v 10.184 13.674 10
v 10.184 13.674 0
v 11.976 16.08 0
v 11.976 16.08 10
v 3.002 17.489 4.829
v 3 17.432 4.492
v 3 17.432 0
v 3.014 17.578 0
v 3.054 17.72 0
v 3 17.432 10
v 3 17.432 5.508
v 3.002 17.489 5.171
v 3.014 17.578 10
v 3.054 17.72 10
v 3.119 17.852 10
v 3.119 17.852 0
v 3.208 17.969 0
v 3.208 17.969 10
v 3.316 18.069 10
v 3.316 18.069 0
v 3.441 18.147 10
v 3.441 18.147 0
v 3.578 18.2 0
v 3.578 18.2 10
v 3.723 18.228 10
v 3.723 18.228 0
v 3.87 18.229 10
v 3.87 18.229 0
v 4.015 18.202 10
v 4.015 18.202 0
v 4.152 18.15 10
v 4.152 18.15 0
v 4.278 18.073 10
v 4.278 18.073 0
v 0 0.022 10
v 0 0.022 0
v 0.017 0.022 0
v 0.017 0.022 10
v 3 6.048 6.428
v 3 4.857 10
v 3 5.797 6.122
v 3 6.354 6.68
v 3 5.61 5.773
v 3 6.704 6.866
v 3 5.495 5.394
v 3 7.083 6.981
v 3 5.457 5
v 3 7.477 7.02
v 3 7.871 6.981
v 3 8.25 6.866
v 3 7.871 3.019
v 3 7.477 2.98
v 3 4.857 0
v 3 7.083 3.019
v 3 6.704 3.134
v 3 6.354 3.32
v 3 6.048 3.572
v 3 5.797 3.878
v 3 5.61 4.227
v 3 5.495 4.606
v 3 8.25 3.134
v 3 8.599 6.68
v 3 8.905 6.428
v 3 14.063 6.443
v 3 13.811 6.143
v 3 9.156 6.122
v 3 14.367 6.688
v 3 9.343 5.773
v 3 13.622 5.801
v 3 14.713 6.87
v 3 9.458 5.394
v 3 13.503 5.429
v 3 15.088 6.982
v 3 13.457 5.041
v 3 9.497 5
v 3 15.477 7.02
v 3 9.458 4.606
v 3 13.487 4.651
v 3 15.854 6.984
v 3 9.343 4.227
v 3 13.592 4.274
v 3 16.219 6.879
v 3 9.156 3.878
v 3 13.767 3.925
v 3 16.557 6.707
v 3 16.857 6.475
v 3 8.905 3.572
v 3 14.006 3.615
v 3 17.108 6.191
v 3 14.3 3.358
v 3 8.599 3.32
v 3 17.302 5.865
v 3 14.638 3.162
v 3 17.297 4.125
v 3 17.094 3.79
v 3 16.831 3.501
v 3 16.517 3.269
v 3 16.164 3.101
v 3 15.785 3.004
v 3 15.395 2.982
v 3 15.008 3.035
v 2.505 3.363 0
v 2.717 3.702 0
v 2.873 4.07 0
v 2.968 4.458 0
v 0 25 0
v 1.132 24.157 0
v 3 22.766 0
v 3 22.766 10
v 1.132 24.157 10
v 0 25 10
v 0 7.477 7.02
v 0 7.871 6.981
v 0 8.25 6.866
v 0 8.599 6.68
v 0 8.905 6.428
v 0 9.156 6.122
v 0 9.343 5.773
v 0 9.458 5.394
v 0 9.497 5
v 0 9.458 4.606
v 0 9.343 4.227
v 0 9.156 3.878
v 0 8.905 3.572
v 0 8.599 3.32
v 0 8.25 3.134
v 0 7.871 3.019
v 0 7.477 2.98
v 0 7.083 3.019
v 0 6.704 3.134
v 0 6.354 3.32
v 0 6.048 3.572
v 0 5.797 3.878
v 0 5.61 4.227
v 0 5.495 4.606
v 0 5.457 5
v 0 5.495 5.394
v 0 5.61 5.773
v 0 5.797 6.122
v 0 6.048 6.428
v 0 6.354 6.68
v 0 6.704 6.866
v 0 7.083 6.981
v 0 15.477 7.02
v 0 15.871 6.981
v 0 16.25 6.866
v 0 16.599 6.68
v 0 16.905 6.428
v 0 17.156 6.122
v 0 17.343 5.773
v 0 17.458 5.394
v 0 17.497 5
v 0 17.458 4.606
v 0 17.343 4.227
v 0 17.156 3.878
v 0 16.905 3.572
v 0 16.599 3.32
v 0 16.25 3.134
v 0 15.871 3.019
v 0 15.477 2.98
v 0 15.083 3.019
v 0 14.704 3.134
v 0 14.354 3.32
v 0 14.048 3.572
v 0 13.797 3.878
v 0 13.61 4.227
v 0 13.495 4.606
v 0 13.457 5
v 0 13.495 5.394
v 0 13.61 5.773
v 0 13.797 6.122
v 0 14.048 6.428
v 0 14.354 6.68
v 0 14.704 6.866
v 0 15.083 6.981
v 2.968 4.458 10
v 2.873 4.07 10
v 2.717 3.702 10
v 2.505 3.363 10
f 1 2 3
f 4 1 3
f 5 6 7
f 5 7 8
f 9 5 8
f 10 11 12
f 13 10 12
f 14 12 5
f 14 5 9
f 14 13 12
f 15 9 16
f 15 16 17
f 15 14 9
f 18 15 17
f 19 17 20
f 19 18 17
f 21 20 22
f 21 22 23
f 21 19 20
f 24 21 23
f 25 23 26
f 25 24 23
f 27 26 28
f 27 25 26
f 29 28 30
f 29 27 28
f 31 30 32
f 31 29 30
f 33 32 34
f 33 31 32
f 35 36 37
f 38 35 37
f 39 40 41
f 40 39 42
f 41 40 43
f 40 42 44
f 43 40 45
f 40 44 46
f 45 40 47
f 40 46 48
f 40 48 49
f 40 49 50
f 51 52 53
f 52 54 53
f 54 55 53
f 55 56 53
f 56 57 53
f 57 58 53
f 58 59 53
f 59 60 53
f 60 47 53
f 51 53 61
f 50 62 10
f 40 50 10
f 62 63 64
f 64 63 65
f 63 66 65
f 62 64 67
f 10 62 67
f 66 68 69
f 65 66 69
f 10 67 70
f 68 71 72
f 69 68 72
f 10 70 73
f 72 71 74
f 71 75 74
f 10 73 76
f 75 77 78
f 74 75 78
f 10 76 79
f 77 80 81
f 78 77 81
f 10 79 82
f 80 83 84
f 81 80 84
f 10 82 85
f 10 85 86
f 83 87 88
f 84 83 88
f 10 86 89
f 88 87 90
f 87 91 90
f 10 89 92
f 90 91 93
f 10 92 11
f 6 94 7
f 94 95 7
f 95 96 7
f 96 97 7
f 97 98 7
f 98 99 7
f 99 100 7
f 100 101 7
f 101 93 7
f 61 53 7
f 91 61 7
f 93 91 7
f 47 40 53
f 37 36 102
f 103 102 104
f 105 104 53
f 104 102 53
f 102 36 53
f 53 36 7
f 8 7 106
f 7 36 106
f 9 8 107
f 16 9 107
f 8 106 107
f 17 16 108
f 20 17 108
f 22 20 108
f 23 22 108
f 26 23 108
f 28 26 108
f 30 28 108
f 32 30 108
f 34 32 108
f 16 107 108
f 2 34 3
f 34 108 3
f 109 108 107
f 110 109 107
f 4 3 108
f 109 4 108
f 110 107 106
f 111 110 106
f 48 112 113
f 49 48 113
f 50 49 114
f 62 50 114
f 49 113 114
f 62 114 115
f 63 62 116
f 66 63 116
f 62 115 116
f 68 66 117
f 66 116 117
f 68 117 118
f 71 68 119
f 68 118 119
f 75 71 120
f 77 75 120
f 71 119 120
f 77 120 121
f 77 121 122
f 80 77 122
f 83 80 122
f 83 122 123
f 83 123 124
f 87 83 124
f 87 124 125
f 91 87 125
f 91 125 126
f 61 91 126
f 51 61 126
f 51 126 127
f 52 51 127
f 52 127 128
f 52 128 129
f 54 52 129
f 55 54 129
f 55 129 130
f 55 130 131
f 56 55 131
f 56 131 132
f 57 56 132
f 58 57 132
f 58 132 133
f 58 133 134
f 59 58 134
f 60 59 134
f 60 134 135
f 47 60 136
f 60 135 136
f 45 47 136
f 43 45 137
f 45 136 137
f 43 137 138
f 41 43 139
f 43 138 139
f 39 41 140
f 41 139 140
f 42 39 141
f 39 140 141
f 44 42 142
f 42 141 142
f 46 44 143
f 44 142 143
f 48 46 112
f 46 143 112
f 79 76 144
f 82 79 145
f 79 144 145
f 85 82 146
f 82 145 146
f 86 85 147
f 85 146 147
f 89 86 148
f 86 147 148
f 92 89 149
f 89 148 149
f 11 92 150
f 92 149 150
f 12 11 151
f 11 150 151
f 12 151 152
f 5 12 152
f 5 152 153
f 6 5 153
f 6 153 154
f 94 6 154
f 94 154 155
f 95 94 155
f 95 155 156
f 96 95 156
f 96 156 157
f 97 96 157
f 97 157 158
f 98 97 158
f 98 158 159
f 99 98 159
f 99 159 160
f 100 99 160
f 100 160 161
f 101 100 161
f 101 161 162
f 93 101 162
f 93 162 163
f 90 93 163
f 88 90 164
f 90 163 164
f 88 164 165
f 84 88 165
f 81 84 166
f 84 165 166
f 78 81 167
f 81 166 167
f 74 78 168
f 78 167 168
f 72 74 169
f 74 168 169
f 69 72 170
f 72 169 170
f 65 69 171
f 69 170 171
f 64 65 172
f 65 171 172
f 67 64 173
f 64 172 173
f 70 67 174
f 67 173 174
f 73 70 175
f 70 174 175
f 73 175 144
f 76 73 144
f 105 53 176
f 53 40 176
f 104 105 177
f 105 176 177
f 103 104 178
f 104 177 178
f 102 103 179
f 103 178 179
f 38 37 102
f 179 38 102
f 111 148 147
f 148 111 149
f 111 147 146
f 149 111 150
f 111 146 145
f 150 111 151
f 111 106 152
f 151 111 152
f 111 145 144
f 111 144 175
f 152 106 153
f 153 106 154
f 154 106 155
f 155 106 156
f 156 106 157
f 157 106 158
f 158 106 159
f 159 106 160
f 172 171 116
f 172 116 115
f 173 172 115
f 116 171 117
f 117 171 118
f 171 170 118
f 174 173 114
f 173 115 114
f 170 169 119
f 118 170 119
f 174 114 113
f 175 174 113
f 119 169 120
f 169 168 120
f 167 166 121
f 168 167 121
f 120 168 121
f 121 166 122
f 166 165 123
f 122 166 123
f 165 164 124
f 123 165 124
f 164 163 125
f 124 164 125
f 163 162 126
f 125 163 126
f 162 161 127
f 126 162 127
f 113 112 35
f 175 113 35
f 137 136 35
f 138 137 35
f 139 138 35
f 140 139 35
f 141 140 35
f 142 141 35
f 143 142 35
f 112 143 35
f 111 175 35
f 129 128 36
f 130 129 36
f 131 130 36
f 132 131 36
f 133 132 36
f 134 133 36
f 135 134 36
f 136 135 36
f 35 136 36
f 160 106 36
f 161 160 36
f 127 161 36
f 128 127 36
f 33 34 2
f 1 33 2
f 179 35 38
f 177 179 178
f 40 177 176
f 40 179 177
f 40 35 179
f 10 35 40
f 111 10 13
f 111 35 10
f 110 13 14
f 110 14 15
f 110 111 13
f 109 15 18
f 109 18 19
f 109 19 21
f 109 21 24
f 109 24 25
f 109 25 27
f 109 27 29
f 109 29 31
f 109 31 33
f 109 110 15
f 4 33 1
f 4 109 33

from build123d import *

# Parameters (mm, degrees)
BOSS_EXTRUDE1_DEPTH = 10
FILLET1_R           = 0.8
FILLET2_R           = 2.5
SKETCH6_R           = 2.02
CUT_EXTRUDE1_DEPTH  = 4


with BuildPart() as part:
    # Sketch2 → Boss-Extrude1 (new body)
    with BuildSketch(Plane.XY):
        Polygon((0, 21.259357975), (0, 0.022383201), (0.016670773, 0.022383201), (3, 4.02798368), (3, 19.024989439), align=None)
        Polygon((0, 22.637274757), (0, 21.259357975), (3, 19.024989439), (3, 22.765631464), (1.131871138, 24.156994247), align=None)
        Polygon((3, 22.765631464), (3, 19.024989439), (10.184363913, 13.674150545), (11.976330523, 16.080154633), align=None)
        Polygon((0, 25), (0, 22.637274757), (1.131871138, 24.156994247), align=None)
    extrude(amount=BOSS_EXTRUDE1_DEPTH)

    # Fillet1
    fillet1_edges = [part.edges().sort_by_distance(p)[0] for p in [
        (3, 19.024989439, 5),
    ]]
    fillet(fillet1_edges, radius=FILLET1_R)

    # Fillet2
    fillet2_edges = [part.edges().sort_by_distance(p)[0] for p in [
        (3, 4.02798368, 5),
    ]]
    fillet(fillet2_edges, radius=FILLET2_R)

    # Sketch6 → Cut-Extrude1 (cut)
    with BuildSketch(Plane.ZY):
        with Locations((5, 15.476622616)):
            Circle(SKETCH6_R)
        with Locations((5, 7.476622616)):
            Circle(SKETCH6_R)
    extrude(amount=-CUT_EXTRUDE1_DEPTH, mode=Mode.SUBTRACT)


solid = part.part
